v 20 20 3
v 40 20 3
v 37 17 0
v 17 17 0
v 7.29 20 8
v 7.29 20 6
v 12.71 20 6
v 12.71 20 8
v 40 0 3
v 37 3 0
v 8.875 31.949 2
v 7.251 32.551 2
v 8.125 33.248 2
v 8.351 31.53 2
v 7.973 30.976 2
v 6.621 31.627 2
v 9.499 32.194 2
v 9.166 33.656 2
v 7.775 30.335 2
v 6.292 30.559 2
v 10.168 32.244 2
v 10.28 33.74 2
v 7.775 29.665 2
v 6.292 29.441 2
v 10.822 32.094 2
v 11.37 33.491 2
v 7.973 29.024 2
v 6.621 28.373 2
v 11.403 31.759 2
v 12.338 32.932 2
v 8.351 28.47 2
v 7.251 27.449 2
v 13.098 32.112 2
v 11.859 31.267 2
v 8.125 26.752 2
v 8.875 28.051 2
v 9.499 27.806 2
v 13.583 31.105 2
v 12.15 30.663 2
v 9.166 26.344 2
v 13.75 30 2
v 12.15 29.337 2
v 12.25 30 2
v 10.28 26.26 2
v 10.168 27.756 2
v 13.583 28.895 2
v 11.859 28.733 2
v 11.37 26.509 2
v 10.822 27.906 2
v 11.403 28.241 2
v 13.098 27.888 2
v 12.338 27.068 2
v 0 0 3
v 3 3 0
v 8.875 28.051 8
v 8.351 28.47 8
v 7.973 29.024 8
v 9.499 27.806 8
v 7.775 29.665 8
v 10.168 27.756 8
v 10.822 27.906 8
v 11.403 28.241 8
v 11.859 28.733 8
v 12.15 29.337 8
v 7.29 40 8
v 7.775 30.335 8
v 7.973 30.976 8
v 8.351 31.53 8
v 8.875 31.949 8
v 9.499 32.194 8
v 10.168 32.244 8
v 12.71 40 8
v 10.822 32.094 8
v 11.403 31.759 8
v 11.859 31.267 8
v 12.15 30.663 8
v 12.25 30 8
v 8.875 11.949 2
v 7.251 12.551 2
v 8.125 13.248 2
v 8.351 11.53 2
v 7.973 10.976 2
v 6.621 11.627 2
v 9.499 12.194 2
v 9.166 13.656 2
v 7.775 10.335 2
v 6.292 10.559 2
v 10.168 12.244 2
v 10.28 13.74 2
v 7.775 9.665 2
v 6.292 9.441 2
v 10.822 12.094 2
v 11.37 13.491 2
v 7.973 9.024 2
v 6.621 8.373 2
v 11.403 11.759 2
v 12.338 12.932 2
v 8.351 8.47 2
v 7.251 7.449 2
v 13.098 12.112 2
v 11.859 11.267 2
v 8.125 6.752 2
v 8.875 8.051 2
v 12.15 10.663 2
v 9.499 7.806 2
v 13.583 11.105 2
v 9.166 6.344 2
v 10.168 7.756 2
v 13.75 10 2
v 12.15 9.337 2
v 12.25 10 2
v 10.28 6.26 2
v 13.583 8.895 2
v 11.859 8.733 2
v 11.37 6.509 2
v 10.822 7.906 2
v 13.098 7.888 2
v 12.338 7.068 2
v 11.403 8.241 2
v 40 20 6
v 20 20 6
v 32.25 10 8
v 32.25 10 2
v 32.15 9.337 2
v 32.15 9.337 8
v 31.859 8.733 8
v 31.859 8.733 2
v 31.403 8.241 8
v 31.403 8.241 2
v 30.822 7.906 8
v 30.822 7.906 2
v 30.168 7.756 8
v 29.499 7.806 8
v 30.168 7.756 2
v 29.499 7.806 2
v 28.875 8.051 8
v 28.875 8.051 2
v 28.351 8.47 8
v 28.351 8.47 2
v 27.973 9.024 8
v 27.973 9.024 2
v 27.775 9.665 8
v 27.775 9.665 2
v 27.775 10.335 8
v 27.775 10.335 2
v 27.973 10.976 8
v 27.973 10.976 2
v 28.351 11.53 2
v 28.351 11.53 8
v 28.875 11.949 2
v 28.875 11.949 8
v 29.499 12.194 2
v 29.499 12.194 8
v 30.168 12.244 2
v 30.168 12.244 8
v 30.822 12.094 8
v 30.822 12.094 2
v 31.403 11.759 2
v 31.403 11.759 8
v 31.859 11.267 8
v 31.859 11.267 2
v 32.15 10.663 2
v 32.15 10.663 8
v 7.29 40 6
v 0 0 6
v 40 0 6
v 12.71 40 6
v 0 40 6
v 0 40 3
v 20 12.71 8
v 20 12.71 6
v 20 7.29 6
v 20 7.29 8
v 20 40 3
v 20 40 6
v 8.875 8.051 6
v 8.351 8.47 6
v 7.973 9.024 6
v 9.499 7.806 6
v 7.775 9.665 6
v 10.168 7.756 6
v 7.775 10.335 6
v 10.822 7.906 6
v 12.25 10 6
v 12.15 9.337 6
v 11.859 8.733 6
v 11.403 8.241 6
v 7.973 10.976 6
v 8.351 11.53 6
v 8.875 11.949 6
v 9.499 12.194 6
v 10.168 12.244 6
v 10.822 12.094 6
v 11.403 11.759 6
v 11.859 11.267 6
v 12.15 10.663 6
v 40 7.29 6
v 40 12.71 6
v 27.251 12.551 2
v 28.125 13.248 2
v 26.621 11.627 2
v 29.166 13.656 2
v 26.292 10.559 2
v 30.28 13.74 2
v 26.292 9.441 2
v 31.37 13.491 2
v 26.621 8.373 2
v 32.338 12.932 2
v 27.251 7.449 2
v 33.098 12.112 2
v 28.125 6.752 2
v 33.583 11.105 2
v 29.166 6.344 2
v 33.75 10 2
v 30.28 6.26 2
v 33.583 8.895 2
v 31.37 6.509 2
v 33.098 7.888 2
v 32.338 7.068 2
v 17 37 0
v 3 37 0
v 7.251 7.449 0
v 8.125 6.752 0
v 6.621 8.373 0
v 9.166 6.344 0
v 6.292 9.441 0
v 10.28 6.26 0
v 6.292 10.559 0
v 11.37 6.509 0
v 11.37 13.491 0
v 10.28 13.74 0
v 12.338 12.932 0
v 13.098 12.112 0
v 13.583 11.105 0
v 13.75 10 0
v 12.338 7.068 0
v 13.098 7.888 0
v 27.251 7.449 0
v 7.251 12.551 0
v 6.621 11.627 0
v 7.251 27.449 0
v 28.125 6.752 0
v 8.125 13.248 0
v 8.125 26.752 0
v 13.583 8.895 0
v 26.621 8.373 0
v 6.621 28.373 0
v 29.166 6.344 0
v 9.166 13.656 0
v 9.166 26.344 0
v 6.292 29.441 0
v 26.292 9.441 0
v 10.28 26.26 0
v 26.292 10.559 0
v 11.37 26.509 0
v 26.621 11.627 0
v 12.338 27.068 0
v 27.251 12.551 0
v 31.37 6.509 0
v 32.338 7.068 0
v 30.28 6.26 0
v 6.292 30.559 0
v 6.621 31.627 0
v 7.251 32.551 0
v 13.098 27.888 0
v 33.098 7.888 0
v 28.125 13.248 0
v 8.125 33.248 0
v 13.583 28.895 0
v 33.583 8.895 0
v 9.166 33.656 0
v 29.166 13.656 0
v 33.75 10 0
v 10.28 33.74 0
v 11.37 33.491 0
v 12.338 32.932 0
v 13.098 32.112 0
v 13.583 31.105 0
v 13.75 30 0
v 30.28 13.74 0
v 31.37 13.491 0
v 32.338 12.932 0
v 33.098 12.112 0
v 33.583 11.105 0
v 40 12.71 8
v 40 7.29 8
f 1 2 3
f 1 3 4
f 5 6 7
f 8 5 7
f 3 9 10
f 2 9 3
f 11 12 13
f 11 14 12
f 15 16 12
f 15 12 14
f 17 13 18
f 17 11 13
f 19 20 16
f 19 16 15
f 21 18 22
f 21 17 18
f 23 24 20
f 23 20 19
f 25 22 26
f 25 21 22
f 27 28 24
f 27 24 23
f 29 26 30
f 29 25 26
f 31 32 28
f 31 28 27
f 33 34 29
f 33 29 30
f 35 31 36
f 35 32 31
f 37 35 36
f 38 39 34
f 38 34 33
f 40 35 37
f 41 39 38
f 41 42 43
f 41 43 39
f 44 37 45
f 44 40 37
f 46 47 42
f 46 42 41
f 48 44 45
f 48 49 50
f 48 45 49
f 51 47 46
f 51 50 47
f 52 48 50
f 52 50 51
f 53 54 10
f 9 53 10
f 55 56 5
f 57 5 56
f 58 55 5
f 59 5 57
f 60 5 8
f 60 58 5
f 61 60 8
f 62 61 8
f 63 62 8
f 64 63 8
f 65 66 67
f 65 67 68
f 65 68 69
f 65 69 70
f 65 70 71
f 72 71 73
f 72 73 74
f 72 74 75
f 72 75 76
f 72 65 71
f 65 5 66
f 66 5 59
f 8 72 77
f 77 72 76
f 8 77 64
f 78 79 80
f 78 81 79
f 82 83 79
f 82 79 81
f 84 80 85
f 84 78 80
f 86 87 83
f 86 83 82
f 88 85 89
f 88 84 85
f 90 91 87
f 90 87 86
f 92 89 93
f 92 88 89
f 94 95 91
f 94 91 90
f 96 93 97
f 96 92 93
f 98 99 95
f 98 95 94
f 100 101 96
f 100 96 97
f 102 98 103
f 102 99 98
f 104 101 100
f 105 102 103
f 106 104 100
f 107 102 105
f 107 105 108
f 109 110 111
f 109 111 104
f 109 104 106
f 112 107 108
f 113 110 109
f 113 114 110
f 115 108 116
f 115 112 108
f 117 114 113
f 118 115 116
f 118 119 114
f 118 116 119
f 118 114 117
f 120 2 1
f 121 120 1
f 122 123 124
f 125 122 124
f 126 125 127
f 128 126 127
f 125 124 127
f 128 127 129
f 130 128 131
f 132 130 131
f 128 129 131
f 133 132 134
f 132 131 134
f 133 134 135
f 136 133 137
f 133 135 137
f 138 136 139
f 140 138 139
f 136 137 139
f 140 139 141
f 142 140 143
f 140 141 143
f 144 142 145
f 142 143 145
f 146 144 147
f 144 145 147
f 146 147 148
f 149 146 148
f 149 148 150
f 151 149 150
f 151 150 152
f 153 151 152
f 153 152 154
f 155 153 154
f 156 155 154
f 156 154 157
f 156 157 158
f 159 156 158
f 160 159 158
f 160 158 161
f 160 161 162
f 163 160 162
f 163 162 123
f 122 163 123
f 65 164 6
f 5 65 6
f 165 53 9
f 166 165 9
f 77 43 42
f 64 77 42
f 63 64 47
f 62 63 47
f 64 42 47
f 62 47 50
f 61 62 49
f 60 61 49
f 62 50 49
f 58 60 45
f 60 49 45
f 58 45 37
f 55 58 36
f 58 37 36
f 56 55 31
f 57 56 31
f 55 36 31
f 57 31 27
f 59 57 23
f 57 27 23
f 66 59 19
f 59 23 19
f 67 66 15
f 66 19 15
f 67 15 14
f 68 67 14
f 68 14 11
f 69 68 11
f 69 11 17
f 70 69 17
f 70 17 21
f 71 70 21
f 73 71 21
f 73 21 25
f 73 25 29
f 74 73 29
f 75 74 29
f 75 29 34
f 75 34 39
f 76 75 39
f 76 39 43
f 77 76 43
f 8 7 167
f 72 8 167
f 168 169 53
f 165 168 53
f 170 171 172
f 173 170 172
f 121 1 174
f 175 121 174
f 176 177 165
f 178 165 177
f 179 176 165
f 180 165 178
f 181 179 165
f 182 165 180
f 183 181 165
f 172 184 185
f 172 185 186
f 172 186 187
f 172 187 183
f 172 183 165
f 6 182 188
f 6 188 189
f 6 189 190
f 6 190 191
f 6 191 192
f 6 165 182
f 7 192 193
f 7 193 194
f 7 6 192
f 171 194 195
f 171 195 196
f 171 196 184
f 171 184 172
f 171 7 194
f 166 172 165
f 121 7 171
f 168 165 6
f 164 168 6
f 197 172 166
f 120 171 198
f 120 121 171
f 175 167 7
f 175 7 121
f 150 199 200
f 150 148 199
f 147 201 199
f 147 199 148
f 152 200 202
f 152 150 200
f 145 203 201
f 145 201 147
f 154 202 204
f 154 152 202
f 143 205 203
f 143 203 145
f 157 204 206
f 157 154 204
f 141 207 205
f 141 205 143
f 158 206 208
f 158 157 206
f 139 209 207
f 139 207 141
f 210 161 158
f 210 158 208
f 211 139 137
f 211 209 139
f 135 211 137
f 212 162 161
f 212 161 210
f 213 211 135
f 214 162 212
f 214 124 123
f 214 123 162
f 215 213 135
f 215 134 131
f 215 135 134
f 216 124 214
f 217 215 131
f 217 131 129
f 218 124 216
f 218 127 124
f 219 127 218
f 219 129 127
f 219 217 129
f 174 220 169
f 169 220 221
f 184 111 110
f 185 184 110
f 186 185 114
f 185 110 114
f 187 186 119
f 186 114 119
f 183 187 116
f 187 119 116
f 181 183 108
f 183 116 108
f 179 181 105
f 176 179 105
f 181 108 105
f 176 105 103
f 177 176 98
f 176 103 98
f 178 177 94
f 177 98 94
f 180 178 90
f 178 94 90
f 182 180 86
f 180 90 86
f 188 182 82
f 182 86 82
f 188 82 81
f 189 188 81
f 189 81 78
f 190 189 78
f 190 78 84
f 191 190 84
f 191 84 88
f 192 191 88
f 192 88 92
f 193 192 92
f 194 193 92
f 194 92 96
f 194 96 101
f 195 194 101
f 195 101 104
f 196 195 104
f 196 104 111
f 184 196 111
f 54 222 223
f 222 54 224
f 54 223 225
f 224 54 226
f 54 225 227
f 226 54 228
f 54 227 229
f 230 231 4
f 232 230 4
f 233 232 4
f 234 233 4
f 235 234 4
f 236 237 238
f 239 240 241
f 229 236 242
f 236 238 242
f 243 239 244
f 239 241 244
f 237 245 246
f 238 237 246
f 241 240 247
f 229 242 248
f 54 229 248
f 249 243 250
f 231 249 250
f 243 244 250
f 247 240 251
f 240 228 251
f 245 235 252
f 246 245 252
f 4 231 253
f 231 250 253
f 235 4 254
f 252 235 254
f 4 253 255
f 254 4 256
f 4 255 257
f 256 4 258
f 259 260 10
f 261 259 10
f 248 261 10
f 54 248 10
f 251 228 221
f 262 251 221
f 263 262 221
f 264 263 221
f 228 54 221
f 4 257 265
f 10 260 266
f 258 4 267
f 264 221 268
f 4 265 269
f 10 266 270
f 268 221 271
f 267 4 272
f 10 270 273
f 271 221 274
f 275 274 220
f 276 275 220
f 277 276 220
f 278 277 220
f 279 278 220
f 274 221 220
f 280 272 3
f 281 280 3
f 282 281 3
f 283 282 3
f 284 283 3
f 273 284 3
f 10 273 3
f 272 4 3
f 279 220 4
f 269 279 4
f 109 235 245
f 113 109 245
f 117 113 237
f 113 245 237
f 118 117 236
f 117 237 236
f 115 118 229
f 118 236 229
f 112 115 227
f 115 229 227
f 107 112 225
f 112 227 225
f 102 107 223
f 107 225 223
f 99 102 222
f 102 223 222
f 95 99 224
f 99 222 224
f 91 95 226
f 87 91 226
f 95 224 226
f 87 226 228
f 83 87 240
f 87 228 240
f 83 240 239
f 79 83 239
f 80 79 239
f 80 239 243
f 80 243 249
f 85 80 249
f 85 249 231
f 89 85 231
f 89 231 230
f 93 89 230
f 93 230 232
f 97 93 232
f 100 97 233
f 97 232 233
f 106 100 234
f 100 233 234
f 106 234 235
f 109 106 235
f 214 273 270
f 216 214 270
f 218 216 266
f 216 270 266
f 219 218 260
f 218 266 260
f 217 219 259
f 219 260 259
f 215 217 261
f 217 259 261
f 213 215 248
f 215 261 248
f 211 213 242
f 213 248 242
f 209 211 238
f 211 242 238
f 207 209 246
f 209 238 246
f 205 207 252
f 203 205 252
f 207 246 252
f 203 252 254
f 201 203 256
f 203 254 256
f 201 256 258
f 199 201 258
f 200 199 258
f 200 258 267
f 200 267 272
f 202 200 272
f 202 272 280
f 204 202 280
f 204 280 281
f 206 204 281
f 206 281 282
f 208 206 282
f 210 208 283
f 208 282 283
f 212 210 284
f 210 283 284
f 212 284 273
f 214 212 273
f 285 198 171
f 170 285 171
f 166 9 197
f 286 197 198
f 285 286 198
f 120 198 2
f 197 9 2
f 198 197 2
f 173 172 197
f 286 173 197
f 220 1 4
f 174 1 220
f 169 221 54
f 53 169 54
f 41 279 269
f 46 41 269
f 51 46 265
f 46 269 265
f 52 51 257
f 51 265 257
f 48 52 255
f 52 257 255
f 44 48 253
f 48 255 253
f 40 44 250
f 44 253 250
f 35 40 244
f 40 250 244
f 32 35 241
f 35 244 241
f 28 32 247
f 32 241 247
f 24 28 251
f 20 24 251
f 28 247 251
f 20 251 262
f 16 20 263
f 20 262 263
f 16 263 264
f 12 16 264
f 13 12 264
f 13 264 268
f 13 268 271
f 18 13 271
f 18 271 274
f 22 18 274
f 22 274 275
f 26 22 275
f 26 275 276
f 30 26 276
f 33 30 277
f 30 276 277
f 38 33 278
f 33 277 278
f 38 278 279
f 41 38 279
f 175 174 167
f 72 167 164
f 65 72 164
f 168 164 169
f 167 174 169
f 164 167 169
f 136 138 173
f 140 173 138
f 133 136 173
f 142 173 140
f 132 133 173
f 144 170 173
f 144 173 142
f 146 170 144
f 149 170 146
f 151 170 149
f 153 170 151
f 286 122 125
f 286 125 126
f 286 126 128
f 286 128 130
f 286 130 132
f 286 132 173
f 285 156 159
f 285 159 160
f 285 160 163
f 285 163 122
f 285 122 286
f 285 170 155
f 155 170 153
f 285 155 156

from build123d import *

# Parameters (mm, degrees)
F1_DEPTH = 6
F3_DEPTH = 2
F4_R     = 2.25
F5_DEPTH = 8.001
F6_R     = 3.75
F7_DEPTH = 2
F8_SIZE  = 3


with BuildPart() as f1:
    # F0 (on Top) → F1 (new body)
    with BuildSketch(Plane.XY):
        Polygon((0, 40), (0, 0), (40, 0), (40, 20), (20, 20), (20, 40), align=None)
    extrude(amount=F1_DEPTH)

    # F2 (on face) → F3 (join)
    with BuildSketch(Plane.XY.offset(6)):
        Polygon((12.71, 40), (7.29, 40), (7.29, 20), (10, 20), (12.71, 20), align=None)
        Polygon((40, 7.29), (40, 12.71), (20, 12.71), (20, 10), (20, 7.29), align=None)
    extrude(amount=F3_DEPTH)

    # F4 (on face) → F5 (cut, through all)
    with BuildSketch(Plane(origin=(0, 0, 0), x_dir=(1, 0, 0), z_dir=(0, 0, -1))):
        with Locations((10, -30)):
            Circle(F4_R)
        with Locations((10, -10)):
            Circle(F4_R)
        with Locations((30, -10)):
            Circle(F4_R)
    extrude(amount=-F5_DEPTH, mode=Mode.SUBTRACT)

    # F6 (on face) → F7 (cut)
    with BuildSketch(Plane(origin=(0, 0, 0), x_dir=(1, 0, 0), z_dir=(0, 0, -1))):
        with Locations((10, -10)):
            Circle(F6_R)
        with Locations((30, -10)):
            Circle(F6_R)
        with Locations((10, -30)):
            Circle(F6_R)
    extrude(amount=-F7_DEPTH, mode=Mode.SUBTRACT)

    # F8
    f8_edges = [f1.edges().sort_by_distance(p)[0] for p in [
        (20, 0, 0),
        (0, 20, 0),
        (20, 30, 0),
        (30, 20, 0),
        (40, 10, 0),
        (10, 40, 0),
    ]]
    chamfer(f8_edges, length=F8_SIZE)


solid = f1.part
